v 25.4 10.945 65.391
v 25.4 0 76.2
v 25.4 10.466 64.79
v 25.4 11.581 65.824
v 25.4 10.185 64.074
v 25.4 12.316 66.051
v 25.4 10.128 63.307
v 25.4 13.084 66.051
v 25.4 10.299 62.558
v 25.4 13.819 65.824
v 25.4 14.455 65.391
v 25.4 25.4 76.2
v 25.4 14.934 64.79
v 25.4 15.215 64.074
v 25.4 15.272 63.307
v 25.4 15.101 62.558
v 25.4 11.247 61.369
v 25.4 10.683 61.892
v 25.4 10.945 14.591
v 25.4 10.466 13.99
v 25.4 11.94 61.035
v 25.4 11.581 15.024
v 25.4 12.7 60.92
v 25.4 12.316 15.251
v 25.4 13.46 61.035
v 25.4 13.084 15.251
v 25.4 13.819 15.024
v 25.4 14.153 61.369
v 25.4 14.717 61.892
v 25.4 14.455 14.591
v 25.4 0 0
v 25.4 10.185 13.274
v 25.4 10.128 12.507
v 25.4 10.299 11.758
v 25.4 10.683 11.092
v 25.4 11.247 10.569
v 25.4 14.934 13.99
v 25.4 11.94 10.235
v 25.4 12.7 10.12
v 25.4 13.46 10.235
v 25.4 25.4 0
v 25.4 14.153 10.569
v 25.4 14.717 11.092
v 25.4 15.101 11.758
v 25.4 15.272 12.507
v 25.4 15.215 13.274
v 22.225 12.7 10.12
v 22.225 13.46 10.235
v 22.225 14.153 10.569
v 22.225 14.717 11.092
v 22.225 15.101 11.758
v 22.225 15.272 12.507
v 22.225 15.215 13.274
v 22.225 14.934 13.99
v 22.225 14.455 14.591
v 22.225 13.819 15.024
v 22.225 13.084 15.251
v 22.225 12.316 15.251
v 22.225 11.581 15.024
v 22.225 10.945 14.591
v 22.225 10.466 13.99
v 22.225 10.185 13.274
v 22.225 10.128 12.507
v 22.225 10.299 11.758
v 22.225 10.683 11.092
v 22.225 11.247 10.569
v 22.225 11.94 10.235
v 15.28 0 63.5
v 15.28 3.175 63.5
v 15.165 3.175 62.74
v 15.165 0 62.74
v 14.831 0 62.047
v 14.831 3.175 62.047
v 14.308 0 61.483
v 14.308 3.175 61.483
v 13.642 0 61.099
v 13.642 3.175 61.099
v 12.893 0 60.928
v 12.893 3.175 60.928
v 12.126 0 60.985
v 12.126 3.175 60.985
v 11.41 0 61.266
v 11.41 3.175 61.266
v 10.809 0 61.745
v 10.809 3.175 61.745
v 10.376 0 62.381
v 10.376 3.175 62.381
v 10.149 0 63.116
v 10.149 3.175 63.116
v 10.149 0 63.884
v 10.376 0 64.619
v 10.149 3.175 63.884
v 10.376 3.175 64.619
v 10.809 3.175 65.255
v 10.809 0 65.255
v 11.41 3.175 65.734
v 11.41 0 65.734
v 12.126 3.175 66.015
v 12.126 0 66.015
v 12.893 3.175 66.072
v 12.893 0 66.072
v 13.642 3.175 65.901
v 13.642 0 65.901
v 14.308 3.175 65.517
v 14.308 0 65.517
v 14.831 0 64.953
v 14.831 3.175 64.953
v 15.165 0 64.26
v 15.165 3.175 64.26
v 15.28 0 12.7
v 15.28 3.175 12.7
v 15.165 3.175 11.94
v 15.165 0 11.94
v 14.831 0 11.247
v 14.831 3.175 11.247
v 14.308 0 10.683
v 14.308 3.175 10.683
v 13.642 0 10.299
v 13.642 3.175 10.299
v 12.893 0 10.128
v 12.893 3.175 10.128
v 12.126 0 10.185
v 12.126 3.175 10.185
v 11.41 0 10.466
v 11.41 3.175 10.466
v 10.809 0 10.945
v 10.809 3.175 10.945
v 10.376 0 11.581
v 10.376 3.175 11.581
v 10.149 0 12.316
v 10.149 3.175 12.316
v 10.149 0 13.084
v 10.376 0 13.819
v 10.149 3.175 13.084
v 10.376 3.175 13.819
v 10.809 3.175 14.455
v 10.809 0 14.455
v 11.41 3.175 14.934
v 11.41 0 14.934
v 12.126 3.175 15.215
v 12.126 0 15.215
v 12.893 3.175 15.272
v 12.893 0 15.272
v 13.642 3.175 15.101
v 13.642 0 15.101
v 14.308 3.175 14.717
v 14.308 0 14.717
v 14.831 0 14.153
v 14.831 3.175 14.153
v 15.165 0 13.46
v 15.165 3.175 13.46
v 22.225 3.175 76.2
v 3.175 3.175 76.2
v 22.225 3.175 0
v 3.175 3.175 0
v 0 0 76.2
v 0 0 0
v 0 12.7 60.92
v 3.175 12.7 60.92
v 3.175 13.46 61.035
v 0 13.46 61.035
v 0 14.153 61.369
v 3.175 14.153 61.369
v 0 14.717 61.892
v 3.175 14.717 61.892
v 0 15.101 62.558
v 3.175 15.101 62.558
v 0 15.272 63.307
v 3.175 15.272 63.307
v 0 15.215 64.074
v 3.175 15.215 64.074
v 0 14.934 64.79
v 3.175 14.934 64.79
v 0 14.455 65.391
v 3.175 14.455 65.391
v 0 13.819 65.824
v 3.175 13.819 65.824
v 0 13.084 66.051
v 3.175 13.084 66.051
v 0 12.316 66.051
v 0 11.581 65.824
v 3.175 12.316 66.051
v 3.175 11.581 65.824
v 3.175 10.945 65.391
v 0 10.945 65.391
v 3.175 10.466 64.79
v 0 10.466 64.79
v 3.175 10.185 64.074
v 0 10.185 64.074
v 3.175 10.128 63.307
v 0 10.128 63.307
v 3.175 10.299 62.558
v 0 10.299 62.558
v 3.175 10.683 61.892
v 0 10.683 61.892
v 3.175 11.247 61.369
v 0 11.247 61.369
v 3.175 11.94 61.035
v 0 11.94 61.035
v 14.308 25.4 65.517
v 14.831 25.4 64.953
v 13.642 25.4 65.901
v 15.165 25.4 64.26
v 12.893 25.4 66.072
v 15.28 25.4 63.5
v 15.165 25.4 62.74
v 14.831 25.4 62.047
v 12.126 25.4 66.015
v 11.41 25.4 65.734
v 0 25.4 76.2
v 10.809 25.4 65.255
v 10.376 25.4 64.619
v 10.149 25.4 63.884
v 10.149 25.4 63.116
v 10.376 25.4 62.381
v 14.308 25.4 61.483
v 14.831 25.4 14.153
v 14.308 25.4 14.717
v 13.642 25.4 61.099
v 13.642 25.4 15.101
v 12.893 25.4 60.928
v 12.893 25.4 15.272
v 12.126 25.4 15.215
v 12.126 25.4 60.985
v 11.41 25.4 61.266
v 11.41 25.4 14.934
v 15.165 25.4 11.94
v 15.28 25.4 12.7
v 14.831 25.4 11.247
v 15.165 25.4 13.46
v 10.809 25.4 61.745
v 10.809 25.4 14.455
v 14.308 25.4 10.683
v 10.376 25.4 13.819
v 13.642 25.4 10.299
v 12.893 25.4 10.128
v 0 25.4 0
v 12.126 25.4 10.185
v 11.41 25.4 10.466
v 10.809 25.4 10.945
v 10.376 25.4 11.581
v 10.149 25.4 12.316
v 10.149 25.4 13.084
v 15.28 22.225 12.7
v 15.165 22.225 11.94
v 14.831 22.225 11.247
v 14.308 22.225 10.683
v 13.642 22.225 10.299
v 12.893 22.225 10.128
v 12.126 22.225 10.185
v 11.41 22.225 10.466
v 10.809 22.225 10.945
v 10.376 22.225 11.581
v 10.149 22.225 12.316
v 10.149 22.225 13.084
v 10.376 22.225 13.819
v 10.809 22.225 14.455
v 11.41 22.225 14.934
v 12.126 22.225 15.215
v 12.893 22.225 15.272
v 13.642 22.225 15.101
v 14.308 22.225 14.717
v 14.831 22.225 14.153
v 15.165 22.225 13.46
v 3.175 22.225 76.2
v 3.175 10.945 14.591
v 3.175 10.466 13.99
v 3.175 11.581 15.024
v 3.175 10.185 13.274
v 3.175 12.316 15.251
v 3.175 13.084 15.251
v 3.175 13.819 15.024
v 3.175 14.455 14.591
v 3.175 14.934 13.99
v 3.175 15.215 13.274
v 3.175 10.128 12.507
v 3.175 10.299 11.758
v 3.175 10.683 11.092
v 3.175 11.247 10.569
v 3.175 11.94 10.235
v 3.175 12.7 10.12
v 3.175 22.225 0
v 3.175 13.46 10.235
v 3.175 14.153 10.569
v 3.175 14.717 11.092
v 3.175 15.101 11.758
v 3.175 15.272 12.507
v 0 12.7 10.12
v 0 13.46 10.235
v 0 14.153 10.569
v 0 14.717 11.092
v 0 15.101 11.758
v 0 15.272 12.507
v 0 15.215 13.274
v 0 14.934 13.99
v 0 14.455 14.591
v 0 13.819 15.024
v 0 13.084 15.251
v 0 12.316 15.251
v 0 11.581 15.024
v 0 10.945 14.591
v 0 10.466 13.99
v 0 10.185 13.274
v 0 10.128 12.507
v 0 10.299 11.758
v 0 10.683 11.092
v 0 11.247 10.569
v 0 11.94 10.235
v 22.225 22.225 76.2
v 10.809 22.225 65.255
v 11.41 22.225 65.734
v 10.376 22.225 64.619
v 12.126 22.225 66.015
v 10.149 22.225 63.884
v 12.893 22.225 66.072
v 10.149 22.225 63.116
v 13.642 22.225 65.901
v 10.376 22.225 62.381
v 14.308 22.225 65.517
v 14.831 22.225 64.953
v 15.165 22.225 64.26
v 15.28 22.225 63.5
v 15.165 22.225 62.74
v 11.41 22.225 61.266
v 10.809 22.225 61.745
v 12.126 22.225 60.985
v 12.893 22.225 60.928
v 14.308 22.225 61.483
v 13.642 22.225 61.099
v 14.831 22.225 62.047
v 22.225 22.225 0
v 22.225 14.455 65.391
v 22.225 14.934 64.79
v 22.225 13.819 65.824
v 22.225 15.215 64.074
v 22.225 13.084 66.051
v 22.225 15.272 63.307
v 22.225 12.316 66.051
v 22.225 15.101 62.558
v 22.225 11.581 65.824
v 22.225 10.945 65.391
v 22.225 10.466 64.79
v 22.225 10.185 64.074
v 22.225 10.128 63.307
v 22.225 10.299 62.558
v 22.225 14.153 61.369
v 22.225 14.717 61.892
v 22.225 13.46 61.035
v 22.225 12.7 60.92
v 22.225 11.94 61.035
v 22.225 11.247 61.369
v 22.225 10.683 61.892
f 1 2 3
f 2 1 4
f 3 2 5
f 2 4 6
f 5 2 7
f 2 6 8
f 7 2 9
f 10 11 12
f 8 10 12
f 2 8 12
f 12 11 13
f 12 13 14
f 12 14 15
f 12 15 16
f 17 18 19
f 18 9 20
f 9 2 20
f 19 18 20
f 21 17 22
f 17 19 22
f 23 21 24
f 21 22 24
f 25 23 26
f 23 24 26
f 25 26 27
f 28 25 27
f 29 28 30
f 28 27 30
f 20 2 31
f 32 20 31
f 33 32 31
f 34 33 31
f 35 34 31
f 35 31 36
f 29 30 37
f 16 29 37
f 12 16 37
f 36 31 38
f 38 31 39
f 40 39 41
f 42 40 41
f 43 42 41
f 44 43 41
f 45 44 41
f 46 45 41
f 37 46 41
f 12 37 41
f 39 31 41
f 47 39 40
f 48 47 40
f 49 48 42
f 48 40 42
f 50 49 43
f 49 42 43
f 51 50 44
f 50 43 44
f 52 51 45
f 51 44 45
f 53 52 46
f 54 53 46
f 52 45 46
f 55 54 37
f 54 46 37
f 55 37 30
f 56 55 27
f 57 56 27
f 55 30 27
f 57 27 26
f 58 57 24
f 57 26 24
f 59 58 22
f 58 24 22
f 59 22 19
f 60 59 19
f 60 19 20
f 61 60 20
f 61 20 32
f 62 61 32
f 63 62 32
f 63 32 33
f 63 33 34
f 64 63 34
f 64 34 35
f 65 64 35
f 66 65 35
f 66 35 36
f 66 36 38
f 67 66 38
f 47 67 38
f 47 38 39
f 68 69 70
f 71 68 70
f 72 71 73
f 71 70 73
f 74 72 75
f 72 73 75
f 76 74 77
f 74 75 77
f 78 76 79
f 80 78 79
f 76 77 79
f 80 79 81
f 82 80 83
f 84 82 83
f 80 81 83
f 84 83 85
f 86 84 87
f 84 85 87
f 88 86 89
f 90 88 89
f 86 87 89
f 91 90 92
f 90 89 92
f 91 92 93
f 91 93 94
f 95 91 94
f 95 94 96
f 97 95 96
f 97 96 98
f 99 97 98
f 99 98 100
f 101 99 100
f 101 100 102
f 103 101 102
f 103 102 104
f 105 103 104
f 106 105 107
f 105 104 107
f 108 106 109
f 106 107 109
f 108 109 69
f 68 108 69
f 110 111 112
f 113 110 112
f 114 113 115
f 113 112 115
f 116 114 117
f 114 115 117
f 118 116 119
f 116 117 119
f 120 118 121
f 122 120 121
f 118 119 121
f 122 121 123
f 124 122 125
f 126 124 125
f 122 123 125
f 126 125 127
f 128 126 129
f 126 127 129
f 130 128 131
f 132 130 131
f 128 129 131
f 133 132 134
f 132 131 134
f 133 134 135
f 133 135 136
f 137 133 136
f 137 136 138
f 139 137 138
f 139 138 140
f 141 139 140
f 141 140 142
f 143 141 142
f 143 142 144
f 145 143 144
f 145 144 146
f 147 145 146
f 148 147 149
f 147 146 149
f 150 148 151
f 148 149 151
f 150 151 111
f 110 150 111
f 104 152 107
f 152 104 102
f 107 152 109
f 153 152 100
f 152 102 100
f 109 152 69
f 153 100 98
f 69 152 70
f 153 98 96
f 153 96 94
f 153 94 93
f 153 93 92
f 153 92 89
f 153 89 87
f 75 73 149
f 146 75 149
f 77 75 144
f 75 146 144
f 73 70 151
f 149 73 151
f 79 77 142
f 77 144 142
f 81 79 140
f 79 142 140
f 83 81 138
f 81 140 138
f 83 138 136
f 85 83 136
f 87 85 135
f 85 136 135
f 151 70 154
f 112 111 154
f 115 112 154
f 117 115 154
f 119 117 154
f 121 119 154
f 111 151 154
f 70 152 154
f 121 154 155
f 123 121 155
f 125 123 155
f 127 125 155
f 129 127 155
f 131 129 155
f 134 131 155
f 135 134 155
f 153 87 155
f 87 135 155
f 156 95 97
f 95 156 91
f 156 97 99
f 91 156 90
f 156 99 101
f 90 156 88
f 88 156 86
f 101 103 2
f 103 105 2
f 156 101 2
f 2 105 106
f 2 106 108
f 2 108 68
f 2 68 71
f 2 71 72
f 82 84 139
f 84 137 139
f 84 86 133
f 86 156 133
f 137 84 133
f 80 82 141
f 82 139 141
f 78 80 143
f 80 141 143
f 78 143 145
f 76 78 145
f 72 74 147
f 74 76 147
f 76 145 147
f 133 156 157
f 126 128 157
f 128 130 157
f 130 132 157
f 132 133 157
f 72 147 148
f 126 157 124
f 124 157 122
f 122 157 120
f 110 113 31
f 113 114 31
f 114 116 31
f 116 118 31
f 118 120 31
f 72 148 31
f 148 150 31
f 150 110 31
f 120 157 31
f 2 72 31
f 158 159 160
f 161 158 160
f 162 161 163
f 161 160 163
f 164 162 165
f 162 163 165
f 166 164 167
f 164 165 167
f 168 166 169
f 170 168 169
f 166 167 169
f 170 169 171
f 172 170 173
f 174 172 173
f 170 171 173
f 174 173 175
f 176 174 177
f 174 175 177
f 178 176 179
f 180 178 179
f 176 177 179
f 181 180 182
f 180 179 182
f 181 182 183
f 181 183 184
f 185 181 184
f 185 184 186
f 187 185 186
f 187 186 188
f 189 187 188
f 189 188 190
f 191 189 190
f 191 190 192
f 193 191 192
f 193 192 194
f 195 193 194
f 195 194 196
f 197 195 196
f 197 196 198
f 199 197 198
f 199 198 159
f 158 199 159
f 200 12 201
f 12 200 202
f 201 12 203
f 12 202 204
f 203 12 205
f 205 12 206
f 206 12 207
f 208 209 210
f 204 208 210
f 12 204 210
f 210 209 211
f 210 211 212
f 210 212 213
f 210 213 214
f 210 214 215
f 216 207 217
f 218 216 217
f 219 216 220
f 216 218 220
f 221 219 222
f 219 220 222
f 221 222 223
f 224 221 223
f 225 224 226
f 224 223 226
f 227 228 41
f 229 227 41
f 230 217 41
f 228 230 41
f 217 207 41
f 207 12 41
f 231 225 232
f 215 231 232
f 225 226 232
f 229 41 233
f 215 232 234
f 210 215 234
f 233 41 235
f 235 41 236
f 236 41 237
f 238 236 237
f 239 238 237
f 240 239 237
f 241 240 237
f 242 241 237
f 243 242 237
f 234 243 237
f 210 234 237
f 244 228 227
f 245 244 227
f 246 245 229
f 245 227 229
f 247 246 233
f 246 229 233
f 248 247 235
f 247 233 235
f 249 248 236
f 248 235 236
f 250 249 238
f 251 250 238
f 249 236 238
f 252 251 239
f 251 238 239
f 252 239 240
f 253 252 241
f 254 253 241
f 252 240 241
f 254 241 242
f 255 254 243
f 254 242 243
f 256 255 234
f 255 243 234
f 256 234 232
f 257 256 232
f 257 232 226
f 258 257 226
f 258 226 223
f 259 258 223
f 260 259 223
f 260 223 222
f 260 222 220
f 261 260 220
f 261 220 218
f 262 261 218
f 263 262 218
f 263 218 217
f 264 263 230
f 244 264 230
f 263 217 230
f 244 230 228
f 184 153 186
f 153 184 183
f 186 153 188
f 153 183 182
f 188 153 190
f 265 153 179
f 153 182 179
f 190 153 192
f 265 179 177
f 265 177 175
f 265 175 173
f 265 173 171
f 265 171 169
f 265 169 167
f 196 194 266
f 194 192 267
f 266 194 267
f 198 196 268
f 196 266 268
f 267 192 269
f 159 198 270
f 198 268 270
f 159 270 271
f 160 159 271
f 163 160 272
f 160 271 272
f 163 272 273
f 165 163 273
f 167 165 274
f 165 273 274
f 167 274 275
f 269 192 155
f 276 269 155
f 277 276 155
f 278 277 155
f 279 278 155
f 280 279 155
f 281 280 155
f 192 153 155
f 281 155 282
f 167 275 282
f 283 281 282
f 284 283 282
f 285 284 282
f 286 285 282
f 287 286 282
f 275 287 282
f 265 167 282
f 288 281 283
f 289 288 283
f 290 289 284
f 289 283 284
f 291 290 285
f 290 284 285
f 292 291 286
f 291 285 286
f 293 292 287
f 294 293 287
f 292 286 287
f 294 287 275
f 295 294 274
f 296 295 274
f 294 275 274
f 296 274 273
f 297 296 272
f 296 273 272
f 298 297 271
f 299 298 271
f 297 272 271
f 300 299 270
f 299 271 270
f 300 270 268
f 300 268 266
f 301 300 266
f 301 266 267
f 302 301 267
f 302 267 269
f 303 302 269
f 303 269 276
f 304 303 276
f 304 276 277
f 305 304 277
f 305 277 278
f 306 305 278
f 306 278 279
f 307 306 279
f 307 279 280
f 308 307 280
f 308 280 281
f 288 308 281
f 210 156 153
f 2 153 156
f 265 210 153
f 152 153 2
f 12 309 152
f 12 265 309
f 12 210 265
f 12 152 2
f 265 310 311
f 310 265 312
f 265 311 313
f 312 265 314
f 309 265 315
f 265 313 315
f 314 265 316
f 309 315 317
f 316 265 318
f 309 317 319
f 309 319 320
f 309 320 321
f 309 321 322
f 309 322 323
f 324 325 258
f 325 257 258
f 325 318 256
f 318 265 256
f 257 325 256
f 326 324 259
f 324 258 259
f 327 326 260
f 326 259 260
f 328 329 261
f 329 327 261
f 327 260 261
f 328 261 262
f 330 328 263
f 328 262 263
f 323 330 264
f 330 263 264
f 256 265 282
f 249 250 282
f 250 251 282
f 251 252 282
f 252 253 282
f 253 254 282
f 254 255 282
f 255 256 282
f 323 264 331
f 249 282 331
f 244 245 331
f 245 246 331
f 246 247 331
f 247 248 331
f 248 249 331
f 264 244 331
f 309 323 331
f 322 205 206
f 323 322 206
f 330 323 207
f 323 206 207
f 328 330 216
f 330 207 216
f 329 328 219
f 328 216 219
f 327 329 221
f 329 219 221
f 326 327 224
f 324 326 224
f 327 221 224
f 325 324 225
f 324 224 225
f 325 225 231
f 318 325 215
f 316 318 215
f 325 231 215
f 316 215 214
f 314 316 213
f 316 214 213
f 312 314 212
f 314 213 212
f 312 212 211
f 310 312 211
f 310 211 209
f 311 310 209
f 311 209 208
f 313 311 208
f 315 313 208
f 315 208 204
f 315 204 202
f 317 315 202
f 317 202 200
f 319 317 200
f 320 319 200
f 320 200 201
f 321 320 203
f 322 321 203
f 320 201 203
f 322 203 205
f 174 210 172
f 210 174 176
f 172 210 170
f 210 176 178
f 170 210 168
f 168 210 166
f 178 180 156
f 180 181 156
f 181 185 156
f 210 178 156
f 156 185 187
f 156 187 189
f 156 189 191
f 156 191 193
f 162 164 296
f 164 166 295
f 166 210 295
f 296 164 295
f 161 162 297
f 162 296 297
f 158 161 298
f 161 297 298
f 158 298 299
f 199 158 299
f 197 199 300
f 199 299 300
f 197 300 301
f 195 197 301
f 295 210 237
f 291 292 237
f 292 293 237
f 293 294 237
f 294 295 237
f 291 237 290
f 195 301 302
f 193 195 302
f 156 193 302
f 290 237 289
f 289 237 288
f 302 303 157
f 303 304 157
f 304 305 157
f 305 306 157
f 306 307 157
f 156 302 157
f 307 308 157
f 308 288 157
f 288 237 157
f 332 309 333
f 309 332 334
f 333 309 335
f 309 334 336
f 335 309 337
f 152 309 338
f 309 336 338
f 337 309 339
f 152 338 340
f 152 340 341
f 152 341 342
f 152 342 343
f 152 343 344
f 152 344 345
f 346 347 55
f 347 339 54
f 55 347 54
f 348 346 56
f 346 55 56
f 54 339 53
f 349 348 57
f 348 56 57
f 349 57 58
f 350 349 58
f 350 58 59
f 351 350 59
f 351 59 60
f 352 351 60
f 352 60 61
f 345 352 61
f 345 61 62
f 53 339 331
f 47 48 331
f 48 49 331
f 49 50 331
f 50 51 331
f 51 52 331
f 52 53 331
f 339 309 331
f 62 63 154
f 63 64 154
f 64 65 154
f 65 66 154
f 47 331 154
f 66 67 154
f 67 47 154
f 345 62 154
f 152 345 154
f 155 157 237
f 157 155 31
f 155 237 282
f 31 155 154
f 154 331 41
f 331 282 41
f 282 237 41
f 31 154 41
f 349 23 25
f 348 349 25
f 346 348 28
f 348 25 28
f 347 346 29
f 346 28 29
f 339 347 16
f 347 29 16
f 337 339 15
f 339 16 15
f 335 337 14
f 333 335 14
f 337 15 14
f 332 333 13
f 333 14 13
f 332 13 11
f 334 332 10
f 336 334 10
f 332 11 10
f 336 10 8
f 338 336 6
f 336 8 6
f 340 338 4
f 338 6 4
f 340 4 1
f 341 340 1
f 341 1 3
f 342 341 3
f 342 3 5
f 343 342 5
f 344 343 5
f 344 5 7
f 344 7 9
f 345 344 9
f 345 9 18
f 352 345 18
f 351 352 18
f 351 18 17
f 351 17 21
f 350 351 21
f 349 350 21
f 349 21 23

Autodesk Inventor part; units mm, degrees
ref_plane "YZ Plane" through (0, 0, 0) normal (1, 0, 0) x (0, 1, 0)
ref_plane "XZ Plane" through (0, 0, 0) normal (0, 1, 0) x (-1, 0, 0)
ref_plane "XY Plane" through (0, 0, 0) normal (0, 0, 1) x (1, 0, 0)
sketch "Sketch1" plane through (0, 0, 0) normal (0, 0, 1) x (1, 0, 0)
  line L0 (0, 0) -> (25.4, 0)
  line L1 (25.4, 0) -> (25.4, 25.4)
  line L2 (25.4, 25.4) -> (0, 25.4)
  line L3 (0, 25.4) -> (0, 0)
  line L4 (3.175, 22.225) -> (22.225, 22.225)
  line L5 (22.225, 22.225) -> (22.225, 3.175)
  line L6 (22.225, 3.175) -> (3.175, 3.175)
  line L7 (3.175, 3.175) -> (3.175, 22.225)
  dimension "d0" = 25.4
  dimension "d1" = 25.4
  dimension "d2" = 3.175
extrude "Extrusion1" add sketch "Sketch1" along normal blind 76.2
sketch "Sketch2" plane through (0, 25.4, 0) normal (0, 1, 0) x (1, 0, 0)
  line L0 (3.175, 0) -> (22.225, 0) construction
  line L1 (12.7, 0) -> (12.7, -12.7) construction
  line L2 (0, -76.2) -> (25.4, -76.2) construction
  line L3 (12.7, -76.2) -> (12.7, -63.5) construction
  circle A0 centre (12.7, -63.5) radius 2.5797
  circle A1 centre (12.7, -12.7) radius 2.5797
  point P0 (0, 0)
  dimension "d5" = 12.7
  dimension "d6" = 12.7
  dimension "d7" = 5.1594
extrude "Extrusion2" cut sketch "Sketch2" against normal blind 76.2
sketch "Sketch3" plane through (25.4, 0, 0) normal (1, 0, 0) x (0, 0, -1)
  line L0 (0, 22.225) -> (0, 3.175) projected
  line L1 (0, 12.7) -> (-12.7, 12.7) construction
  line L2 (-76.2, 3.175) -> (-76.2, 22.225) projected
  line L3 (-76.2, 12.7) -> (-63.5, 12.7) construction
  circle A0 centre (-63.5, 12.7) radius 2.5797
  circle A1 centre (-12.7, 12.7) radius 2.5797
  point P0 (0, 0)
  dimension "d10" = 12.7
  dimension "d11" = 12.7
  dimension "d12" = 5.1594
extrude "Extrusion3" cut sketch "Sketch3" against normal blind 76.2
properties part number "1x1 3in"
